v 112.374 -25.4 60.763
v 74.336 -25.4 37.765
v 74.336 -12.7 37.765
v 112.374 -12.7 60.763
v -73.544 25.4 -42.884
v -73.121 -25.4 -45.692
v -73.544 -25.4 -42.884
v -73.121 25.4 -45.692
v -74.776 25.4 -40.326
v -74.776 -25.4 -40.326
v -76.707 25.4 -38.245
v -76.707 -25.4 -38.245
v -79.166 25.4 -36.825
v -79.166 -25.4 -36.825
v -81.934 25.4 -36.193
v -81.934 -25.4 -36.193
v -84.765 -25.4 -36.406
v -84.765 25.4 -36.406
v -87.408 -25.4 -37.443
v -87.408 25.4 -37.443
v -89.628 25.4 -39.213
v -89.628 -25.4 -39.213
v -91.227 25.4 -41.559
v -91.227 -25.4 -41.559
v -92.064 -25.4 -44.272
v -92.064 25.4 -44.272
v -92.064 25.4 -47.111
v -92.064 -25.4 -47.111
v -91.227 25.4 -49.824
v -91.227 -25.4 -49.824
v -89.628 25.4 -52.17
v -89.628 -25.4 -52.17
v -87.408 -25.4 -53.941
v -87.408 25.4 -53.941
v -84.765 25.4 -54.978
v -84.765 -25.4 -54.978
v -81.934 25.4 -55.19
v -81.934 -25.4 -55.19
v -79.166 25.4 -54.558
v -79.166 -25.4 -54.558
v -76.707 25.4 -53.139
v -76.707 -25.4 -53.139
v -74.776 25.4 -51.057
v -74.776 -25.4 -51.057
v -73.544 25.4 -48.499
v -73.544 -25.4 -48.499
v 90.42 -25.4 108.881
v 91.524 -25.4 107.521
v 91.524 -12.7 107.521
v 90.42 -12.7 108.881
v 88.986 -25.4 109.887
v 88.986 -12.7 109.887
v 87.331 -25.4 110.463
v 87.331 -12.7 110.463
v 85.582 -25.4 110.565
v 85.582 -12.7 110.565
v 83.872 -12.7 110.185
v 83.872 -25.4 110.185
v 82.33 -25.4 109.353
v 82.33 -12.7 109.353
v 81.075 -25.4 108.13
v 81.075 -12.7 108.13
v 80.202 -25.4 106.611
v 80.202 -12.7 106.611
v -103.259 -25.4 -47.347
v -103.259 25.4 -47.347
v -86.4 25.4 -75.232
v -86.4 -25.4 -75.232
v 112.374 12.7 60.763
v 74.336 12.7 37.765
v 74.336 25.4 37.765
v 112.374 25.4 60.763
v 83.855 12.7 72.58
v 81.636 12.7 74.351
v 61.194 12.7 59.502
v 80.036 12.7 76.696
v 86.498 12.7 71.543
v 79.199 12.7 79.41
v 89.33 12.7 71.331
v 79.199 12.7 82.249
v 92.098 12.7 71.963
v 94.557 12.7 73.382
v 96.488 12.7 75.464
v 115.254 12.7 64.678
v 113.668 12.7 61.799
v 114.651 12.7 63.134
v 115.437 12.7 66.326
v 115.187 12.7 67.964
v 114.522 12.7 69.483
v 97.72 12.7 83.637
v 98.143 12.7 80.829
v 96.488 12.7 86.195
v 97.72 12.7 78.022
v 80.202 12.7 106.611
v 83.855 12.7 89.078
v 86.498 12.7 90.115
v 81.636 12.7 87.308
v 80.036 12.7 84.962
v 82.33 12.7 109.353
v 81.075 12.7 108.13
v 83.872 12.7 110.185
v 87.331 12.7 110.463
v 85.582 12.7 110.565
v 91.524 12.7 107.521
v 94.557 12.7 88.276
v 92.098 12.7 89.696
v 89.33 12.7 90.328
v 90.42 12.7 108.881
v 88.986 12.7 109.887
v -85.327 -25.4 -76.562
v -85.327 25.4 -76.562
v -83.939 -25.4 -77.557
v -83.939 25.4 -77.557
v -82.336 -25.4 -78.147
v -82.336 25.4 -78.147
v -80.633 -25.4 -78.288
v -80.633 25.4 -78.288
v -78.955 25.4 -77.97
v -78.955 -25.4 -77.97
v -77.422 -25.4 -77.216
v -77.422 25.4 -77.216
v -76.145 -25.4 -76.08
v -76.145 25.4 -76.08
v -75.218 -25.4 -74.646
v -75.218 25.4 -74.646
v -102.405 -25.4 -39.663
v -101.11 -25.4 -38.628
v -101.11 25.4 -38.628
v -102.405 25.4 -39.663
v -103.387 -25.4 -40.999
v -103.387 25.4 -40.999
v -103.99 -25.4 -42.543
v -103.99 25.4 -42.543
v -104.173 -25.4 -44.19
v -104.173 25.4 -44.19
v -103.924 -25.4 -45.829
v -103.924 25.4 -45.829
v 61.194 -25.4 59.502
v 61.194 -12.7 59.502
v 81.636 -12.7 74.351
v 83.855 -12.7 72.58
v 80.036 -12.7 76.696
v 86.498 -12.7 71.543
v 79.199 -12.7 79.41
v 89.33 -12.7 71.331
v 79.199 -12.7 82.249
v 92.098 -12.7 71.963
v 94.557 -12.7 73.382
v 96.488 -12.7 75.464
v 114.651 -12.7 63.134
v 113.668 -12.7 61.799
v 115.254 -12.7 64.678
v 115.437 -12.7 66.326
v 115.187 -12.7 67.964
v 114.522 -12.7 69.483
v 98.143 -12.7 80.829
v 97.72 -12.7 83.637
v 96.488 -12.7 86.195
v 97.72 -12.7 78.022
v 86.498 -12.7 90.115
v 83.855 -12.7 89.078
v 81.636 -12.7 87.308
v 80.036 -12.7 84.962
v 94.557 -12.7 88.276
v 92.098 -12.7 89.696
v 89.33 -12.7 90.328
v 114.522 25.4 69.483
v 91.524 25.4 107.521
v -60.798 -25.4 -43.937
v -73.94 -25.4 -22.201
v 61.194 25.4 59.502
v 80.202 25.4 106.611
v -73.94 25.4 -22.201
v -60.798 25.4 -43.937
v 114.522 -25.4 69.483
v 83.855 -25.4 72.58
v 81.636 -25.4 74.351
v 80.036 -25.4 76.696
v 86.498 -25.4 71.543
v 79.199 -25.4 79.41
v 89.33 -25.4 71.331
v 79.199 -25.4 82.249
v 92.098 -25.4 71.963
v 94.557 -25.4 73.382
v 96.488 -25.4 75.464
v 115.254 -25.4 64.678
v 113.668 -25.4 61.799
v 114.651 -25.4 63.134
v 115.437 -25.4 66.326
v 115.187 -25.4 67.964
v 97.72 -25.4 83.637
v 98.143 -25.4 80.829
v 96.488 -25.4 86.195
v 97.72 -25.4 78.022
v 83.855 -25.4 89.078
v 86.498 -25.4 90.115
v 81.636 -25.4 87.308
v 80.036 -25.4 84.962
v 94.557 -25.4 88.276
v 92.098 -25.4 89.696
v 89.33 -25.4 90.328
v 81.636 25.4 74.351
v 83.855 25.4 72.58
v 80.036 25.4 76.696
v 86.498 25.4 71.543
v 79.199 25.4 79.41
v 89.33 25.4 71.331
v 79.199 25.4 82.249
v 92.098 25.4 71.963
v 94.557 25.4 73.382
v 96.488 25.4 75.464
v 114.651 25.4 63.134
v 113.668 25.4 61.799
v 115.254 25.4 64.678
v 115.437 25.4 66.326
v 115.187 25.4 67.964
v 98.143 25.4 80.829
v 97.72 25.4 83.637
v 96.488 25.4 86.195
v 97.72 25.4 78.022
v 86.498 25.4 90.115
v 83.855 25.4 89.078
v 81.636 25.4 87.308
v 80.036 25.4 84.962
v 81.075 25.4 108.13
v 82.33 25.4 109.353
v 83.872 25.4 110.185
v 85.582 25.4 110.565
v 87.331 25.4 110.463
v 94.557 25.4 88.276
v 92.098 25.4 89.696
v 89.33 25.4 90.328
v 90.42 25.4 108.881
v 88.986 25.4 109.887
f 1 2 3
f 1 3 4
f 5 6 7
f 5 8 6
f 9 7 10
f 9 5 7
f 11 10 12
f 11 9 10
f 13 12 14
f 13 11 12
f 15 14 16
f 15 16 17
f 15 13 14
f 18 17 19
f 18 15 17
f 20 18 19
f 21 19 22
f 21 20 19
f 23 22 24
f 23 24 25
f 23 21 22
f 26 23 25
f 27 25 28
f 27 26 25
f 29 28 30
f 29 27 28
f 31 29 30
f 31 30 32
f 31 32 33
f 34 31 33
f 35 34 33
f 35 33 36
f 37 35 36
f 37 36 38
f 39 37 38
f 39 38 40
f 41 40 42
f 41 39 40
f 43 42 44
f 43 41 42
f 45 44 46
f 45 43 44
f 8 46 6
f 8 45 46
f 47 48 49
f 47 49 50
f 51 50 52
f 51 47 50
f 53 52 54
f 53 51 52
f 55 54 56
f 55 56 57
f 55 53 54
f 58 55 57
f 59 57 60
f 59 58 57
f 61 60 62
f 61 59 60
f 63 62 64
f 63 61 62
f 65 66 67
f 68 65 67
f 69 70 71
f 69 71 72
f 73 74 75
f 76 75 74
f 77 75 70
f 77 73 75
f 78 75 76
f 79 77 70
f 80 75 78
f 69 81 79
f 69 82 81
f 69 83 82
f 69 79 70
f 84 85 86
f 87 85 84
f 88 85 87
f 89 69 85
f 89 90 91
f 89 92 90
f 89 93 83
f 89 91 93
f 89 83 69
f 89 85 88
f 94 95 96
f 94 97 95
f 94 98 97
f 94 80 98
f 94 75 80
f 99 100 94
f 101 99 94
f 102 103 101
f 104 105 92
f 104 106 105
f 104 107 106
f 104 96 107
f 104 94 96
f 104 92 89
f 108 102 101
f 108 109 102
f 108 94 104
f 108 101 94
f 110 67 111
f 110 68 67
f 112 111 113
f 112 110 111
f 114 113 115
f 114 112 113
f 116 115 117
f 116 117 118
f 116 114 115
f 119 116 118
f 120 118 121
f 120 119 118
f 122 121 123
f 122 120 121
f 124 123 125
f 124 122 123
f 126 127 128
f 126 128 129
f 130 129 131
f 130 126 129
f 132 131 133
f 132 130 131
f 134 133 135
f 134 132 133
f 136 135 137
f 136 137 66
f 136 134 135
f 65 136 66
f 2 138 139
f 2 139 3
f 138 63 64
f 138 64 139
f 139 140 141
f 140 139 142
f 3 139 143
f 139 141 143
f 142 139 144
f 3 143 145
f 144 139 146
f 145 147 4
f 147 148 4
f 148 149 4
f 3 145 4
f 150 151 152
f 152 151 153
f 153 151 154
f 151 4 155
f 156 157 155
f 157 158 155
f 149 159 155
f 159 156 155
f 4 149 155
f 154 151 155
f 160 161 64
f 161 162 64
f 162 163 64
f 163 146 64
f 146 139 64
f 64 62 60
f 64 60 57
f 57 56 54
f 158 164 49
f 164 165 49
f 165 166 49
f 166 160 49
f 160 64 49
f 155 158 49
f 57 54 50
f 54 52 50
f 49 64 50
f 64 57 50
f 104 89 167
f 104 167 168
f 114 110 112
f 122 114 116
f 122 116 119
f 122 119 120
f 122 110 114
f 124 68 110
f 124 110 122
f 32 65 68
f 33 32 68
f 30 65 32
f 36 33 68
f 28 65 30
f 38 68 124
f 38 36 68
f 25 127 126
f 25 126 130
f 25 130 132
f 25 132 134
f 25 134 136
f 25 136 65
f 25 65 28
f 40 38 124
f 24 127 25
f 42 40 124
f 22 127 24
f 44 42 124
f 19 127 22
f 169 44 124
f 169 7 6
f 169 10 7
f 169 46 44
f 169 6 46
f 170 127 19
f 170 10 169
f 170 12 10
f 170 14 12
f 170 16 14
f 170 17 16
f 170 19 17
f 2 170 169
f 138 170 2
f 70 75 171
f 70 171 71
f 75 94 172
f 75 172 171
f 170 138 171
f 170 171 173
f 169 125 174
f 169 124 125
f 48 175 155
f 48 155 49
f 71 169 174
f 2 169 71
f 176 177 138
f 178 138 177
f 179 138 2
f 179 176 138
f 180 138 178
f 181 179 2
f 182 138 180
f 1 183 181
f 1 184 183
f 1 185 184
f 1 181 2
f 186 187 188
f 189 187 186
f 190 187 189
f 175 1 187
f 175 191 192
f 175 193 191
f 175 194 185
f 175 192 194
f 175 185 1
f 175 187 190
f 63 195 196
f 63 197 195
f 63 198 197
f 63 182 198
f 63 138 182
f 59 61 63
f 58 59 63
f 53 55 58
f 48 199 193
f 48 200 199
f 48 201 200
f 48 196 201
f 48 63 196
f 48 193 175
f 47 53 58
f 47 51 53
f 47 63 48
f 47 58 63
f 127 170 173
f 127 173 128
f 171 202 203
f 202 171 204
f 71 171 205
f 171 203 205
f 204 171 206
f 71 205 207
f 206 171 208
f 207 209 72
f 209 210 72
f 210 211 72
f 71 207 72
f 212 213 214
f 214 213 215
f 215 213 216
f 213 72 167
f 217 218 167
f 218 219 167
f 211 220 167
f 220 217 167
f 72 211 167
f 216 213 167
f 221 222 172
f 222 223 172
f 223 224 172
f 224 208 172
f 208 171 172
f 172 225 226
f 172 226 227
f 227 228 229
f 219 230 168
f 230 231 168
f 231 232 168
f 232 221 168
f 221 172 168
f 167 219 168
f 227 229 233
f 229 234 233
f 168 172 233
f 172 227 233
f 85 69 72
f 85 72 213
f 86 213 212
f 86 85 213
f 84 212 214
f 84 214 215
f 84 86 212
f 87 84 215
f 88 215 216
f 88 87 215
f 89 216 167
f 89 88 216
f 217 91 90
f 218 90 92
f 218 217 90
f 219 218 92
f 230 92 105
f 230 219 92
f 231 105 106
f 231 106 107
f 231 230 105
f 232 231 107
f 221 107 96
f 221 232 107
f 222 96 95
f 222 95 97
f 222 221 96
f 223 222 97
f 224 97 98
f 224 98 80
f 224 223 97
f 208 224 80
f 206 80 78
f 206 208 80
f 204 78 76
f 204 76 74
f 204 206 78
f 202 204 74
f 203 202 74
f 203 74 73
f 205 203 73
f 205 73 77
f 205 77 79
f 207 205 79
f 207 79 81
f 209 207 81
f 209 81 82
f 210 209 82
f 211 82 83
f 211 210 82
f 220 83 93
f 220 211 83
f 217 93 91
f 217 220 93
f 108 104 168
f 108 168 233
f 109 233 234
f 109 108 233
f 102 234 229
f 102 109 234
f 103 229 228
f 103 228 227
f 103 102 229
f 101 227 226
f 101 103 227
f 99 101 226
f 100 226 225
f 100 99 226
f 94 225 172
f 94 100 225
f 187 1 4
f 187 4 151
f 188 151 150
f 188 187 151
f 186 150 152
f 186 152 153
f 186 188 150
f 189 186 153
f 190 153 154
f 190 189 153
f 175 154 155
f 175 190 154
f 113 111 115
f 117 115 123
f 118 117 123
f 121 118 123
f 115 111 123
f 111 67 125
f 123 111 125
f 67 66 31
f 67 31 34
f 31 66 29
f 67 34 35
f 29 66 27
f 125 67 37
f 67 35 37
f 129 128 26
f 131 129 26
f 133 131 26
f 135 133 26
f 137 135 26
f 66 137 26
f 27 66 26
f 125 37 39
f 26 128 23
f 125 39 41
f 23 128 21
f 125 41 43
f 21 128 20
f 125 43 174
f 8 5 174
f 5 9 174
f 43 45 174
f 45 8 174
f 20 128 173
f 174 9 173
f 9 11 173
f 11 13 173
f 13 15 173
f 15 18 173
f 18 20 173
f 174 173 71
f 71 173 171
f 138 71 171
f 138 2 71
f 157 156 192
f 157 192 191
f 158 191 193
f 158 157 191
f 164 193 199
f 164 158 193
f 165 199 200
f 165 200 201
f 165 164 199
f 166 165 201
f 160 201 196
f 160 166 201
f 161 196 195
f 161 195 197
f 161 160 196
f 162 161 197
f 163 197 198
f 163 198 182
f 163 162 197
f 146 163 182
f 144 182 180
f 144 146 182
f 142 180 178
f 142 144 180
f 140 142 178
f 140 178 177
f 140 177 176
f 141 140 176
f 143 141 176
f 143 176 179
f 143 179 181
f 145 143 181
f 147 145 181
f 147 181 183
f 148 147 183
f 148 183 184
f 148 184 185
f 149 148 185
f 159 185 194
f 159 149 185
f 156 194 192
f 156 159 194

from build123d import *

# Parameters (mm, degrees)
F0_R     = 9.525
F1_DEPTH = 25.4
F2_DEPTH = 25.4
F3_DEPTH = 12.7
F4_DEPTH = 25.4


with BuildPart() as f1:
    # F0 (on Front) → F1 (new body, symmetric)
    with BuildSketch(Plane.XZ):
        with BuildLine():
            Line((80.201589, 106.611499), (61.193916, 59.501539))
            Line((61.193916, 59.501539), (74.335598, 37.765482))
            Line((74.335598, 37.765482), (112.373699, 60.763426))
            ThreePointArc((112.373699, 60.763426), (115.25385, 64.678155), (114.522292, 69.48286))
            Line((114.522292, 69.48286), (91.524349, 107.520961))
            ThreePointArc((91.524349, 107.520961), (85.58193, 110.565155), (80.201589, 106.611499))
        make_face()
        with Locations((88.617948, 80.829176)):
            Circle(F0_R, mode=Mode.SUBTRACT)
    extrude(amount=F1_DEPTH, both=True)

    # F0 (on Front) → F3 (cut, symmetric)
    with BuildSketch(Plane.XZ):
        with BuildLine():
            Line((80.201589, 106.611499), (61.193916, 59.501539))
            Line((61.193916, 59.501539), (74.335598, 37.765482))
            Line((74.335598, 37.765482), (112.373699, 60.763426))
            ThreePointArc((112.373699, 60.763426), (115.25385, 64.678155), (114.522292, 69.48286))
            Line((114.522292, 69.48286), (91.524349, 107.520961))
            ThreePointArc((91.524349, 107.520961), (85.58193, 110.565155), (80.201589, 106.611499))
        make_face()
        with Locations((88.617948, 80.829176)):
            Circle(F0_R, mode=Mode.SUBTRACT)
    extrude(amount=F3_DEPTH, both=True, mode=Mode.SUBTRACT)


with BuildPart() as f2:
    # F0 (on Front) → F2 (new body, symmetric)
    with BuildSketch(Plane.XZ):
        Polygon((74.335598, 37.765482), (61.193916, 59.501539), (-73.940142, -22.200898), (-60.79846, -43.936956), align=None)
    extrude(amount=F2_DEPTH, both=True)

    # F0 (on Front) → F4 (join, symmetric)
    with BuildSketch(Plane.XZ):
        with BuildLine():
            Line((-60.79846, -43.936956), (-73.940142, -22.200898))
            Line((-73.940142, -22.200898), (-101.110213, -38.628001))
            ThreePointArc((-101.110213, -38.628001), (-103.990364, -42.54273), (-103.258807, -47.347436))
            Line((-103.258807, -47.347436), (-86.399728, -75.231988))
            ThreePointArc((-86.399728, -75.231988), (-80.633124, -78.287851), (-75.217829, -74.645517))
            Line((-75.217829, -74.645517), (-60.79846, -43.936956))
        make_face()
        with Locations((-82.645503, -45.691744)):
            Circle(F0_R, mode=Mode.SUBTRACT)
    extrude(amount=F4_DEPTH, both=True)


solid = Compound([f1.part, f2.part])
